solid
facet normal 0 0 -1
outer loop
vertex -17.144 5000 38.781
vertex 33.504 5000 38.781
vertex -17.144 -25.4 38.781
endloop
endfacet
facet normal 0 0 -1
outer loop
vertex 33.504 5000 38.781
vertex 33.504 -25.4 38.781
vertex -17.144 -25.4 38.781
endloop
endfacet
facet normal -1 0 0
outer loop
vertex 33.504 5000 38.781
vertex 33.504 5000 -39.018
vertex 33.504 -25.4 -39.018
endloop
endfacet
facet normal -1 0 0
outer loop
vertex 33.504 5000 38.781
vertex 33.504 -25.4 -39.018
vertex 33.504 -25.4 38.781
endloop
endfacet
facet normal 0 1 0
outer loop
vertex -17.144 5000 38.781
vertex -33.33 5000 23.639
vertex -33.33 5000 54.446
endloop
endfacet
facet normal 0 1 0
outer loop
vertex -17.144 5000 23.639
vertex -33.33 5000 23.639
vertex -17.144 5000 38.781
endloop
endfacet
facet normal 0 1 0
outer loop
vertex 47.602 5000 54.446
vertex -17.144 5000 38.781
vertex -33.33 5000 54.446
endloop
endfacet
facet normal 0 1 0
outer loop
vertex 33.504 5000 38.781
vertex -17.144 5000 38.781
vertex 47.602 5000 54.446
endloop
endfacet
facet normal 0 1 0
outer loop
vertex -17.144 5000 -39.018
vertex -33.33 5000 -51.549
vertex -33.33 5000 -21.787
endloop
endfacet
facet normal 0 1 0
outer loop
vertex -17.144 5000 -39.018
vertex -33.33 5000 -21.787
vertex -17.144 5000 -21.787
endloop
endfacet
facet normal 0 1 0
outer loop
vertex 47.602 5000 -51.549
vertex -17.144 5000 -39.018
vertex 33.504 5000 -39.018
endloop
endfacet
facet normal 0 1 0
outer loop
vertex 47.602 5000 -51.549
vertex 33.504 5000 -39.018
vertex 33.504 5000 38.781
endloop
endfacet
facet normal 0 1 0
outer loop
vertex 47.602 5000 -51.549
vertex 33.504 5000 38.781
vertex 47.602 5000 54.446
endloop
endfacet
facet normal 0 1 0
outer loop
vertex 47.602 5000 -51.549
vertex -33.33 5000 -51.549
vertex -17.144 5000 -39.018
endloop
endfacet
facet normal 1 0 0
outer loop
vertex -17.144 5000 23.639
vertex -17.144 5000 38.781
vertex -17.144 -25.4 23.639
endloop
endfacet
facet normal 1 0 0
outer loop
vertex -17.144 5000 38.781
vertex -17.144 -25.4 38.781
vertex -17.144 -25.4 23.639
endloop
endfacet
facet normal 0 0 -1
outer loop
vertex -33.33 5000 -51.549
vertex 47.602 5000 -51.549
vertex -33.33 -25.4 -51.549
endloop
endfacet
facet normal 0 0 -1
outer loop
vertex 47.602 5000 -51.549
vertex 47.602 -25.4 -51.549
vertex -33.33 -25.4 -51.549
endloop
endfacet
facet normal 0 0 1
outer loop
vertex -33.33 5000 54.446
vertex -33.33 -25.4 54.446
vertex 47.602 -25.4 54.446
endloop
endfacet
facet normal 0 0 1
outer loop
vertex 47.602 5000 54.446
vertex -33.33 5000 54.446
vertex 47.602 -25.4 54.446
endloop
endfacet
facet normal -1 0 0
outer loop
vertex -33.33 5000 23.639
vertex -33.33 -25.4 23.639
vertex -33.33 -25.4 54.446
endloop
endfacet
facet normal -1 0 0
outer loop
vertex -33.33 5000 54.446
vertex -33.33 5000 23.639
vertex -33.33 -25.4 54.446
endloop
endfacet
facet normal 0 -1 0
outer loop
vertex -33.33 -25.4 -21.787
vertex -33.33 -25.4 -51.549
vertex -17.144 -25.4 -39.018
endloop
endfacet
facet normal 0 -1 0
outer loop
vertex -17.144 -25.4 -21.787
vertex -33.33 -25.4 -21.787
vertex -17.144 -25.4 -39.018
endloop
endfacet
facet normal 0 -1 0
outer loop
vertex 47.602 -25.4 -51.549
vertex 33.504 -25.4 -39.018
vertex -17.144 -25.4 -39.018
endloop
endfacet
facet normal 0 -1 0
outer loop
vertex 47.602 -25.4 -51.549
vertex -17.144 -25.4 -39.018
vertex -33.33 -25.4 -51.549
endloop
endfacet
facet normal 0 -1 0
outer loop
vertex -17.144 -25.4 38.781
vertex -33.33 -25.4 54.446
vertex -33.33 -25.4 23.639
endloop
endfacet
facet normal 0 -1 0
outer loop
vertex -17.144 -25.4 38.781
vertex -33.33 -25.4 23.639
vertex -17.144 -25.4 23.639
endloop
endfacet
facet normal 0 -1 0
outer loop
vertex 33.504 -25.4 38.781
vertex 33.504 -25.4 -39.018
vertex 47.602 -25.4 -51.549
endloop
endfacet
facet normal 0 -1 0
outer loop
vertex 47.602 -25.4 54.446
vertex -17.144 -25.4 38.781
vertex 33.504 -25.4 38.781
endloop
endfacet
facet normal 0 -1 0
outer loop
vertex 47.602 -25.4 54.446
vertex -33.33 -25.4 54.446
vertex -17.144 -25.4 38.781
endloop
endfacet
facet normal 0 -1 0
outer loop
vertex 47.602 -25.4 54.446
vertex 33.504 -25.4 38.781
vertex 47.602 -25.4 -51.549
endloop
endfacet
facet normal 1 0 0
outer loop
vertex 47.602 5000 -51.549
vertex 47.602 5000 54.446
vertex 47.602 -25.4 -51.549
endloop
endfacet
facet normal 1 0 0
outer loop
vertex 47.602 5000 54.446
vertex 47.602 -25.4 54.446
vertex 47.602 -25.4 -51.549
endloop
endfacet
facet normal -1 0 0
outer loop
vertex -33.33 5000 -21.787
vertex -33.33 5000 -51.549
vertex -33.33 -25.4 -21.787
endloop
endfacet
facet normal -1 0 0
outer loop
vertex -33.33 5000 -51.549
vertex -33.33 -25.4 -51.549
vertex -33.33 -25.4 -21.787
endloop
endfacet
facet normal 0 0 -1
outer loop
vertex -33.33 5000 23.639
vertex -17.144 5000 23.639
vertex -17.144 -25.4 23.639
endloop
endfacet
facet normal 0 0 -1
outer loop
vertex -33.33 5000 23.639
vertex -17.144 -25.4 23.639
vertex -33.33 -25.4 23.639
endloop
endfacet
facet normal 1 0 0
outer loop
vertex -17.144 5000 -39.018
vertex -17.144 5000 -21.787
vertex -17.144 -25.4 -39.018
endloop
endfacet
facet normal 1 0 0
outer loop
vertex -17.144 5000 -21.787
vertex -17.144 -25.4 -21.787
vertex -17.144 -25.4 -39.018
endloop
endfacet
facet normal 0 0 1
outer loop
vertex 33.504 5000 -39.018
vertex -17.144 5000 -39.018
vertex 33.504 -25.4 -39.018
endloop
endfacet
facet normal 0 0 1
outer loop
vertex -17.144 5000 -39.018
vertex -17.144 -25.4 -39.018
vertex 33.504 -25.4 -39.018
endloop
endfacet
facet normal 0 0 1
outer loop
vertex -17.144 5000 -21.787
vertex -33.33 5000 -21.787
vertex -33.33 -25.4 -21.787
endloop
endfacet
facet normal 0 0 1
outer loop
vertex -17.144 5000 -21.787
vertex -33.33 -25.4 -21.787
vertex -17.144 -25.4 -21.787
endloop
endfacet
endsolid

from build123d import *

# Parameters (mm, degrees)
F1_DEPTH = 25.4
F2_DEPTH = 5000


with BuildPart() as f1:
    # F0 (on Front) → F1 (new body)
    with BuildSketch(Plane.XZ):
        Polygon((47.601573, 54.445572), (-33.330224, 54.445572), (-33.330224, 23.639277), (-17.14386, 23.639277), (-17.14386, 38.781356), (33.503778, 38.781356), (33.503778, -39.017603), (-17.14386, -39.017603), (-17.14386, -21.786958), (-33.330224, -21.786958), (-33.330224, -51.548973), (47.601573, -51.548973), align=None)
    extrude(amount=F1_DEPTH)

    # F1_face (on face) → F2 (join)
    with BuildSketch(Plane(origin=(12.180467, 0, 3.128197), x_dir=(1, 0, 0), z_dir=(0, 1, 0))):
        Polygon((-45.510691, -51.317375), (35.421106, -51.317375), (35.421106, 54.67717), (-45.510691, 54.67717), (-45.510691, 24.915155), (-29.324327, 24.915155), (-29.324327, 42.1458), (21.323311, 42.1458), (21.323311, -35.653159), (-29.324327, -35.653159), (-29.324327, -20.51108), (-45.510691, -20.51108), align=None)
    extrude(amount=F2_DEPTH)


solid = f1.part
